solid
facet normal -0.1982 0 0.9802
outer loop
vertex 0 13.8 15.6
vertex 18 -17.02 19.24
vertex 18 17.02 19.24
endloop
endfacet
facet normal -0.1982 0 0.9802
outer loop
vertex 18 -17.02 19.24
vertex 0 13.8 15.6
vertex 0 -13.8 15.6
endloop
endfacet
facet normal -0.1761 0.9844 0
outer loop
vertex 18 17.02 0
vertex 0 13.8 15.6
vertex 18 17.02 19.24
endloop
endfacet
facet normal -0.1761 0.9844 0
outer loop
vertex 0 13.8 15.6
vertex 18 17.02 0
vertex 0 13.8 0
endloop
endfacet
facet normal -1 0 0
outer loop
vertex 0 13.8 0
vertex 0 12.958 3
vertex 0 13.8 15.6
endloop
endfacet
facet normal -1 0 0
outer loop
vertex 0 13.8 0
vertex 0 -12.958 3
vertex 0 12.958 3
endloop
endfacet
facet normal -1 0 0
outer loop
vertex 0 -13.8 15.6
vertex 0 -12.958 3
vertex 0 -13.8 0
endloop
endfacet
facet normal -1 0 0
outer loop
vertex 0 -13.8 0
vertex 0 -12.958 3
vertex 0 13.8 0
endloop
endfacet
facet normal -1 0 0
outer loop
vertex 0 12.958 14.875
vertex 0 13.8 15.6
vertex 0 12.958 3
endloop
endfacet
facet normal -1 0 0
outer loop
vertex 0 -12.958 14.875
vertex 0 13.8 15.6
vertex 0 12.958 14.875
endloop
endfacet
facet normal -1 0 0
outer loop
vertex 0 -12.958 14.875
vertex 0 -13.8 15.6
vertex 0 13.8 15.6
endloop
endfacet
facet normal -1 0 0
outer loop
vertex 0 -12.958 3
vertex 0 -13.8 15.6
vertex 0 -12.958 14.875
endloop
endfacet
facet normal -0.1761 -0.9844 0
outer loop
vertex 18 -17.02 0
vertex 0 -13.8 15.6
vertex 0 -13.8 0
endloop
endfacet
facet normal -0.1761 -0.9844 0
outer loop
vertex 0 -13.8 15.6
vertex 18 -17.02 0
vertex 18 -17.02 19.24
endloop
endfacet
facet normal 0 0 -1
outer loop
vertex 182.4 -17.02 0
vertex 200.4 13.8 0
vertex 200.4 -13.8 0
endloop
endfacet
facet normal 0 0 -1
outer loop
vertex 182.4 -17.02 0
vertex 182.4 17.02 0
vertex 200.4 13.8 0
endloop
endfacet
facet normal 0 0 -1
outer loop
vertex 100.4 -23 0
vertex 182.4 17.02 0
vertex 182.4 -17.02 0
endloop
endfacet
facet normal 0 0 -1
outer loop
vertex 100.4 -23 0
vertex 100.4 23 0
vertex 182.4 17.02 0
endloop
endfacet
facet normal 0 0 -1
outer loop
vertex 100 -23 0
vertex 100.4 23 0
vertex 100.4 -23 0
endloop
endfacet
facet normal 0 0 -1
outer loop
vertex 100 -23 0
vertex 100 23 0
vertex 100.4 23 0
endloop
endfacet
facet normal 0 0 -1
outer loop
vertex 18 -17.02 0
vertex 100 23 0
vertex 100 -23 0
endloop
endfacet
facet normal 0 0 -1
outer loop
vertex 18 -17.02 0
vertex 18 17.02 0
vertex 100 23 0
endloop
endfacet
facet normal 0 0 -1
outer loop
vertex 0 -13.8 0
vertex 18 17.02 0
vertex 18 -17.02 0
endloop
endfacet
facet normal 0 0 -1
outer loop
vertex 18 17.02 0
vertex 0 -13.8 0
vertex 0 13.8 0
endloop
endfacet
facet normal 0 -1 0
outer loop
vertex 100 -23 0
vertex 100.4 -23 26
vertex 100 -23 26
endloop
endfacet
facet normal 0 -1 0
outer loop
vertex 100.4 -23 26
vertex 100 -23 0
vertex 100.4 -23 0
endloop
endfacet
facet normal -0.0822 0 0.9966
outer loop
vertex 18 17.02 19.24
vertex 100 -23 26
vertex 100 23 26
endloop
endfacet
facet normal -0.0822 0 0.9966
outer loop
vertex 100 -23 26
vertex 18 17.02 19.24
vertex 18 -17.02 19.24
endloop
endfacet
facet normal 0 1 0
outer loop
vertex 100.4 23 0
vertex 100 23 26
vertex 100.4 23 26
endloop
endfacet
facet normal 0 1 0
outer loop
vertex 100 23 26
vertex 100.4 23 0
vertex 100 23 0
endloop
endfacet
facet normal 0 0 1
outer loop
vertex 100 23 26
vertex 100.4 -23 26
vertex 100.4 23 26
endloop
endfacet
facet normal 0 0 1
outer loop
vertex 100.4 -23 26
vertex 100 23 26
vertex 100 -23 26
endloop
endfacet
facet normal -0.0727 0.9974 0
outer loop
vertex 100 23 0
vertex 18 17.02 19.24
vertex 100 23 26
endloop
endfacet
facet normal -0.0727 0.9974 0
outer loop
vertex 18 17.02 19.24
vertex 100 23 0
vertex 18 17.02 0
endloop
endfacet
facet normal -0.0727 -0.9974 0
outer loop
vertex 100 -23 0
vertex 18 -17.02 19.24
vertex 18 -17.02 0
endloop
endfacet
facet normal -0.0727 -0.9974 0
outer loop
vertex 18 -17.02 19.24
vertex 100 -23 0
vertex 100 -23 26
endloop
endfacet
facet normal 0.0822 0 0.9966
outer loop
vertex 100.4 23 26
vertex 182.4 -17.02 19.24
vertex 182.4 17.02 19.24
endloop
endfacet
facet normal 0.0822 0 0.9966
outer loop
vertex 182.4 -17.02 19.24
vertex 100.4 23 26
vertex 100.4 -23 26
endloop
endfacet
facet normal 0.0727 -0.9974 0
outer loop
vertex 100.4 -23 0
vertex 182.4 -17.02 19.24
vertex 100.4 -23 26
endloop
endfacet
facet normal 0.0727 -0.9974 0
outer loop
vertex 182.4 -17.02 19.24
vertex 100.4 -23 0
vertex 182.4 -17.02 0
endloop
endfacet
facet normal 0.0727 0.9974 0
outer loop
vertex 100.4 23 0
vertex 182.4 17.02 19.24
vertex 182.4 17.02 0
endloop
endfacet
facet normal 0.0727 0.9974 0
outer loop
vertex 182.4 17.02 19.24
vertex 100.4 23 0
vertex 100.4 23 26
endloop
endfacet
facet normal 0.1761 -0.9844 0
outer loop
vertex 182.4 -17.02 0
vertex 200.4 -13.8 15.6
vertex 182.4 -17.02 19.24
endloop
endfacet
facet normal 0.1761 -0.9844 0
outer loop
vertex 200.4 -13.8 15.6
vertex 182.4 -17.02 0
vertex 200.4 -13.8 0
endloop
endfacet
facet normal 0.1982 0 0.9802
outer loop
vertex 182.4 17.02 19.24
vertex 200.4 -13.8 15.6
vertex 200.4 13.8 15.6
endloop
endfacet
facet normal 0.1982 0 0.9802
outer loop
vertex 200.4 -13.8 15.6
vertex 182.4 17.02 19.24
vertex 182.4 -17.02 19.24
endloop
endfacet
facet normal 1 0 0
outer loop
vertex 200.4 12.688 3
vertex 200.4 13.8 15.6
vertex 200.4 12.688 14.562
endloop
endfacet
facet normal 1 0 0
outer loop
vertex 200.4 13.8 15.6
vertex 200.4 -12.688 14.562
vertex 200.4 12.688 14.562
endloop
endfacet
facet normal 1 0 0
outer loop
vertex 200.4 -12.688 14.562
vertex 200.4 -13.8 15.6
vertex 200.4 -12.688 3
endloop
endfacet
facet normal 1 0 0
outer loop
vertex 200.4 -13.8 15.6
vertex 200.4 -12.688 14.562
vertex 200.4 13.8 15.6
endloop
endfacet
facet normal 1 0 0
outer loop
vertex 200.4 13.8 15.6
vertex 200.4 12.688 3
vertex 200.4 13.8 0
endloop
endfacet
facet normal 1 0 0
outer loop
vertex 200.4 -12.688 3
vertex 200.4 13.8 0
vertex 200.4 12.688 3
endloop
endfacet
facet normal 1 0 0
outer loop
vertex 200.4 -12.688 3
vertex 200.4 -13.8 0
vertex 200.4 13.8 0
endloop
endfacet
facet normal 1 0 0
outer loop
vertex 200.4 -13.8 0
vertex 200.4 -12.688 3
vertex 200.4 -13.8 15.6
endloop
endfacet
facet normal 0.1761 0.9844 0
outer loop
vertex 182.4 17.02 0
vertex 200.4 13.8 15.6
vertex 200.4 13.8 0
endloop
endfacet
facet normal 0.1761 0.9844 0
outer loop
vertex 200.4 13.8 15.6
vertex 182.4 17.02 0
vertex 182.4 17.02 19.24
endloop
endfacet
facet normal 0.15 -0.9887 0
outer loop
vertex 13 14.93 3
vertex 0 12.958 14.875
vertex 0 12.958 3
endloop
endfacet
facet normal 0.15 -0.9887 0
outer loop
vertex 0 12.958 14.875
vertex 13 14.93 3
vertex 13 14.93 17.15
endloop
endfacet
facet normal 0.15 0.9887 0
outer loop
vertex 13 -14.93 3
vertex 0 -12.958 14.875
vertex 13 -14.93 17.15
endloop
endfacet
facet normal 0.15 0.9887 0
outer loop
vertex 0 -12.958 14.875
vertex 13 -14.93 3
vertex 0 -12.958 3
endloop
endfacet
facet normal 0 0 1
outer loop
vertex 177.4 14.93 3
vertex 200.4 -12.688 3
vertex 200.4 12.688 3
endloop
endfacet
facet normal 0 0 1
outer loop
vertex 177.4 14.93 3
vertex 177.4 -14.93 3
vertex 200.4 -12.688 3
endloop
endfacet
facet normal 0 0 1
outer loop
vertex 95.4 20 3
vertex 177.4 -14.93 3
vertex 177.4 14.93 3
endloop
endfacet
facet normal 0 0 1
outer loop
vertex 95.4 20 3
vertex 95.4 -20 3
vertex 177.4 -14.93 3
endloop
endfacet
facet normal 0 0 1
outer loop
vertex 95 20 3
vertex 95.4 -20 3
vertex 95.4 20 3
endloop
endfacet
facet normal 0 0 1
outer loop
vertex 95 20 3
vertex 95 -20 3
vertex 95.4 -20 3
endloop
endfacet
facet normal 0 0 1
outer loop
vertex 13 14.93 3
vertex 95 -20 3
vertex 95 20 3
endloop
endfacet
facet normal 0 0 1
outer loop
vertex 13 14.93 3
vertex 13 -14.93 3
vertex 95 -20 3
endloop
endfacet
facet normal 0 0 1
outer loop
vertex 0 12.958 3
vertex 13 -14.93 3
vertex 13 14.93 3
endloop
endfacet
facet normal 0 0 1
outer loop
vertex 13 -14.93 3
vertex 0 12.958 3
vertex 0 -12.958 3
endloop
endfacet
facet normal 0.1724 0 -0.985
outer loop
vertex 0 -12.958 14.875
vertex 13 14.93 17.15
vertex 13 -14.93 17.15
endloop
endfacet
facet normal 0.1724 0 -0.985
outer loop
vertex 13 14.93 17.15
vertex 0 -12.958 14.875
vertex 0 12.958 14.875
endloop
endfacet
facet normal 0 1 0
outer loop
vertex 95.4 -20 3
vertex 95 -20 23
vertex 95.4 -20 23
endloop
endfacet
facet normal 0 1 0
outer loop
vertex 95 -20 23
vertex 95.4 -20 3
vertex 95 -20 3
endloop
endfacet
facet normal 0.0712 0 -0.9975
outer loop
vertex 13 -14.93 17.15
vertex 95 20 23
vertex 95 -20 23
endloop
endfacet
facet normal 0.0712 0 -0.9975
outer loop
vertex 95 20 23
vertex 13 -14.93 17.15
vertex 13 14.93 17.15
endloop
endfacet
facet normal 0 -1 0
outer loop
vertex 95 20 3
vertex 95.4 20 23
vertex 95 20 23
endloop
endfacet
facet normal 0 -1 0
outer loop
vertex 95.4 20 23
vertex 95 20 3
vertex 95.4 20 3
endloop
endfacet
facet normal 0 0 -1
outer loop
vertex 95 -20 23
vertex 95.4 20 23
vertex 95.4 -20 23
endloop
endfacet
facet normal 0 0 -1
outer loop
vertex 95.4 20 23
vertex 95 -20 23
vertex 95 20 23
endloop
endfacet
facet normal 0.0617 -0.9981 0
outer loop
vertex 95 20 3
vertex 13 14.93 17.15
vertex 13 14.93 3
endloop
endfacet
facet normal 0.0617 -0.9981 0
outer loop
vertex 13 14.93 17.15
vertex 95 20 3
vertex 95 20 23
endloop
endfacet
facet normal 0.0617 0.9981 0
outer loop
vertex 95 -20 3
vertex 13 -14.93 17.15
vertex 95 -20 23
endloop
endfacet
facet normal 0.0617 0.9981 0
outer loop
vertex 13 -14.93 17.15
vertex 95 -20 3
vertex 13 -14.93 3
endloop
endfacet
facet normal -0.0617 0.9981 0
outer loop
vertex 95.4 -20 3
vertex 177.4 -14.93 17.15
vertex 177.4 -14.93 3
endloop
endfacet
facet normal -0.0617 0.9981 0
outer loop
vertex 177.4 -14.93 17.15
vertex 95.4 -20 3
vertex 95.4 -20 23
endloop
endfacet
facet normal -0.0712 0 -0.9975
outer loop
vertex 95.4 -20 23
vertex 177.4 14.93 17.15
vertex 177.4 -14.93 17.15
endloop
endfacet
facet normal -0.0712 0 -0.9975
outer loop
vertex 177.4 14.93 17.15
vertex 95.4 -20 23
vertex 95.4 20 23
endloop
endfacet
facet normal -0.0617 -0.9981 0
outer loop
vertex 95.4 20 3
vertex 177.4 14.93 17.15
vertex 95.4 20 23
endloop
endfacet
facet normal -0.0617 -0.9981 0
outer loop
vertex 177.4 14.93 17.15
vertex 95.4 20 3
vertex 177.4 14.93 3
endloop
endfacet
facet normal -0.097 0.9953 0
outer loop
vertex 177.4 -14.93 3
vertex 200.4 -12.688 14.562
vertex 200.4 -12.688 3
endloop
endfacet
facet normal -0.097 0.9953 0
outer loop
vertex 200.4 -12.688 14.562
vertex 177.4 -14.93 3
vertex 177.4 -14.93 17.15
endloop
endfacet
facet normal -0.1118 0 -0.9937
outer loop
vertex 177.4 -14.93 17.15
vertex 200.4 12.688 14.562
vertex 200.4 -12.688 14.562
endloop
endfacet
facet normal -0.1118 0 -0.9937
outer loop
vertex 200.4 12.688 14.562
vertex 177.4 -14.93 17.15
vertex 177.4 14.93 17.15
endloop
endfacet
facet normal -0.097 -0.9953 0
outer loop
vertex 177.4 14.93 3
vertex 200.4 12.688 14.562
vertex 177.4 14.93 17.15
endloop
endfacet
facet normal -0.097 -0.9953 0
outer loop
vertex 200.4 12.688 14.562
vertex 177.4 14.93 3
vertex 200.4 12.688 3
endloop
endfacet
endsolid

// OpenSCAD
$fn = 32;

// ----------------------------------------------------------------------
// Faired channel: 200 x 46 x 26 mm, 3 mm walls, faired ends
// ----------------------------------------------------------------------

// --- parameters (mm) ---
length = 200;             // channel length
width = 46;               // channel width at mid length
height = 26;              // channel height at mid length
wall = 3;                 // side wall thickness
floor_t = 3;              // floor thickness
end_w = 27.6;             // faired end width
end_h = 15.6;             // faired end height

difference() {
  union() {
    hull() {
      translate([0, -13.8, 0]) cube([0.4, 27.6, 15.6]);
      translate([18, -17.02, 0]) cube([0.4, 34.04, 19.24]);
    }
    hull() {
      translate([18, -17.02, 0]) cube([0.4, 34.04, 19.24]);
      translate([100, -23, 0]) cube([0.4, 46, 26]);
    }
    hull() {
      translate([100, -23, 0]) cube([0.4, 46, 26]);
      translate([182, -17.02, 0]) cube([0.4, 34.04, 19.24]);
    }
    hull() {
      translate([182, -17.02, 0]) cube([0.4, 34.04, 19.24]);
      translate([200, -13.8, 0]) cube([0.4, 27.6, 15.6]);
    }
  }
  /* cavity, 5 mm proud of both ends so the ports are cut clean */
  hull() {
    translate([-5, -12.2, 3]) cube([0.4, 24.4, 11]);
    translate([13, -14.93, 3]) cube([0.4, 29.86, 14.15]);
  }
  hull() {
    translate([13, -14.93, 3]) cube([0.4, 29.86, 14.15]);
    translate([95, -20, 3]) cube([0.4, 40, 20]);
  }
  hull() {
    translate([95, -20, 3]) cube([0.4, 40, 20]);
    translate([177, -14.93, 3]) cube([0.4, 29.86, 14.15]);
  }
  hull() {
    translate([177, -14.93, 3]) cube([0.4, 29.86, 14.15]);
    translate([205, -12.2, 3]) cube([0.4, 24.4, 11]);
  }
}
